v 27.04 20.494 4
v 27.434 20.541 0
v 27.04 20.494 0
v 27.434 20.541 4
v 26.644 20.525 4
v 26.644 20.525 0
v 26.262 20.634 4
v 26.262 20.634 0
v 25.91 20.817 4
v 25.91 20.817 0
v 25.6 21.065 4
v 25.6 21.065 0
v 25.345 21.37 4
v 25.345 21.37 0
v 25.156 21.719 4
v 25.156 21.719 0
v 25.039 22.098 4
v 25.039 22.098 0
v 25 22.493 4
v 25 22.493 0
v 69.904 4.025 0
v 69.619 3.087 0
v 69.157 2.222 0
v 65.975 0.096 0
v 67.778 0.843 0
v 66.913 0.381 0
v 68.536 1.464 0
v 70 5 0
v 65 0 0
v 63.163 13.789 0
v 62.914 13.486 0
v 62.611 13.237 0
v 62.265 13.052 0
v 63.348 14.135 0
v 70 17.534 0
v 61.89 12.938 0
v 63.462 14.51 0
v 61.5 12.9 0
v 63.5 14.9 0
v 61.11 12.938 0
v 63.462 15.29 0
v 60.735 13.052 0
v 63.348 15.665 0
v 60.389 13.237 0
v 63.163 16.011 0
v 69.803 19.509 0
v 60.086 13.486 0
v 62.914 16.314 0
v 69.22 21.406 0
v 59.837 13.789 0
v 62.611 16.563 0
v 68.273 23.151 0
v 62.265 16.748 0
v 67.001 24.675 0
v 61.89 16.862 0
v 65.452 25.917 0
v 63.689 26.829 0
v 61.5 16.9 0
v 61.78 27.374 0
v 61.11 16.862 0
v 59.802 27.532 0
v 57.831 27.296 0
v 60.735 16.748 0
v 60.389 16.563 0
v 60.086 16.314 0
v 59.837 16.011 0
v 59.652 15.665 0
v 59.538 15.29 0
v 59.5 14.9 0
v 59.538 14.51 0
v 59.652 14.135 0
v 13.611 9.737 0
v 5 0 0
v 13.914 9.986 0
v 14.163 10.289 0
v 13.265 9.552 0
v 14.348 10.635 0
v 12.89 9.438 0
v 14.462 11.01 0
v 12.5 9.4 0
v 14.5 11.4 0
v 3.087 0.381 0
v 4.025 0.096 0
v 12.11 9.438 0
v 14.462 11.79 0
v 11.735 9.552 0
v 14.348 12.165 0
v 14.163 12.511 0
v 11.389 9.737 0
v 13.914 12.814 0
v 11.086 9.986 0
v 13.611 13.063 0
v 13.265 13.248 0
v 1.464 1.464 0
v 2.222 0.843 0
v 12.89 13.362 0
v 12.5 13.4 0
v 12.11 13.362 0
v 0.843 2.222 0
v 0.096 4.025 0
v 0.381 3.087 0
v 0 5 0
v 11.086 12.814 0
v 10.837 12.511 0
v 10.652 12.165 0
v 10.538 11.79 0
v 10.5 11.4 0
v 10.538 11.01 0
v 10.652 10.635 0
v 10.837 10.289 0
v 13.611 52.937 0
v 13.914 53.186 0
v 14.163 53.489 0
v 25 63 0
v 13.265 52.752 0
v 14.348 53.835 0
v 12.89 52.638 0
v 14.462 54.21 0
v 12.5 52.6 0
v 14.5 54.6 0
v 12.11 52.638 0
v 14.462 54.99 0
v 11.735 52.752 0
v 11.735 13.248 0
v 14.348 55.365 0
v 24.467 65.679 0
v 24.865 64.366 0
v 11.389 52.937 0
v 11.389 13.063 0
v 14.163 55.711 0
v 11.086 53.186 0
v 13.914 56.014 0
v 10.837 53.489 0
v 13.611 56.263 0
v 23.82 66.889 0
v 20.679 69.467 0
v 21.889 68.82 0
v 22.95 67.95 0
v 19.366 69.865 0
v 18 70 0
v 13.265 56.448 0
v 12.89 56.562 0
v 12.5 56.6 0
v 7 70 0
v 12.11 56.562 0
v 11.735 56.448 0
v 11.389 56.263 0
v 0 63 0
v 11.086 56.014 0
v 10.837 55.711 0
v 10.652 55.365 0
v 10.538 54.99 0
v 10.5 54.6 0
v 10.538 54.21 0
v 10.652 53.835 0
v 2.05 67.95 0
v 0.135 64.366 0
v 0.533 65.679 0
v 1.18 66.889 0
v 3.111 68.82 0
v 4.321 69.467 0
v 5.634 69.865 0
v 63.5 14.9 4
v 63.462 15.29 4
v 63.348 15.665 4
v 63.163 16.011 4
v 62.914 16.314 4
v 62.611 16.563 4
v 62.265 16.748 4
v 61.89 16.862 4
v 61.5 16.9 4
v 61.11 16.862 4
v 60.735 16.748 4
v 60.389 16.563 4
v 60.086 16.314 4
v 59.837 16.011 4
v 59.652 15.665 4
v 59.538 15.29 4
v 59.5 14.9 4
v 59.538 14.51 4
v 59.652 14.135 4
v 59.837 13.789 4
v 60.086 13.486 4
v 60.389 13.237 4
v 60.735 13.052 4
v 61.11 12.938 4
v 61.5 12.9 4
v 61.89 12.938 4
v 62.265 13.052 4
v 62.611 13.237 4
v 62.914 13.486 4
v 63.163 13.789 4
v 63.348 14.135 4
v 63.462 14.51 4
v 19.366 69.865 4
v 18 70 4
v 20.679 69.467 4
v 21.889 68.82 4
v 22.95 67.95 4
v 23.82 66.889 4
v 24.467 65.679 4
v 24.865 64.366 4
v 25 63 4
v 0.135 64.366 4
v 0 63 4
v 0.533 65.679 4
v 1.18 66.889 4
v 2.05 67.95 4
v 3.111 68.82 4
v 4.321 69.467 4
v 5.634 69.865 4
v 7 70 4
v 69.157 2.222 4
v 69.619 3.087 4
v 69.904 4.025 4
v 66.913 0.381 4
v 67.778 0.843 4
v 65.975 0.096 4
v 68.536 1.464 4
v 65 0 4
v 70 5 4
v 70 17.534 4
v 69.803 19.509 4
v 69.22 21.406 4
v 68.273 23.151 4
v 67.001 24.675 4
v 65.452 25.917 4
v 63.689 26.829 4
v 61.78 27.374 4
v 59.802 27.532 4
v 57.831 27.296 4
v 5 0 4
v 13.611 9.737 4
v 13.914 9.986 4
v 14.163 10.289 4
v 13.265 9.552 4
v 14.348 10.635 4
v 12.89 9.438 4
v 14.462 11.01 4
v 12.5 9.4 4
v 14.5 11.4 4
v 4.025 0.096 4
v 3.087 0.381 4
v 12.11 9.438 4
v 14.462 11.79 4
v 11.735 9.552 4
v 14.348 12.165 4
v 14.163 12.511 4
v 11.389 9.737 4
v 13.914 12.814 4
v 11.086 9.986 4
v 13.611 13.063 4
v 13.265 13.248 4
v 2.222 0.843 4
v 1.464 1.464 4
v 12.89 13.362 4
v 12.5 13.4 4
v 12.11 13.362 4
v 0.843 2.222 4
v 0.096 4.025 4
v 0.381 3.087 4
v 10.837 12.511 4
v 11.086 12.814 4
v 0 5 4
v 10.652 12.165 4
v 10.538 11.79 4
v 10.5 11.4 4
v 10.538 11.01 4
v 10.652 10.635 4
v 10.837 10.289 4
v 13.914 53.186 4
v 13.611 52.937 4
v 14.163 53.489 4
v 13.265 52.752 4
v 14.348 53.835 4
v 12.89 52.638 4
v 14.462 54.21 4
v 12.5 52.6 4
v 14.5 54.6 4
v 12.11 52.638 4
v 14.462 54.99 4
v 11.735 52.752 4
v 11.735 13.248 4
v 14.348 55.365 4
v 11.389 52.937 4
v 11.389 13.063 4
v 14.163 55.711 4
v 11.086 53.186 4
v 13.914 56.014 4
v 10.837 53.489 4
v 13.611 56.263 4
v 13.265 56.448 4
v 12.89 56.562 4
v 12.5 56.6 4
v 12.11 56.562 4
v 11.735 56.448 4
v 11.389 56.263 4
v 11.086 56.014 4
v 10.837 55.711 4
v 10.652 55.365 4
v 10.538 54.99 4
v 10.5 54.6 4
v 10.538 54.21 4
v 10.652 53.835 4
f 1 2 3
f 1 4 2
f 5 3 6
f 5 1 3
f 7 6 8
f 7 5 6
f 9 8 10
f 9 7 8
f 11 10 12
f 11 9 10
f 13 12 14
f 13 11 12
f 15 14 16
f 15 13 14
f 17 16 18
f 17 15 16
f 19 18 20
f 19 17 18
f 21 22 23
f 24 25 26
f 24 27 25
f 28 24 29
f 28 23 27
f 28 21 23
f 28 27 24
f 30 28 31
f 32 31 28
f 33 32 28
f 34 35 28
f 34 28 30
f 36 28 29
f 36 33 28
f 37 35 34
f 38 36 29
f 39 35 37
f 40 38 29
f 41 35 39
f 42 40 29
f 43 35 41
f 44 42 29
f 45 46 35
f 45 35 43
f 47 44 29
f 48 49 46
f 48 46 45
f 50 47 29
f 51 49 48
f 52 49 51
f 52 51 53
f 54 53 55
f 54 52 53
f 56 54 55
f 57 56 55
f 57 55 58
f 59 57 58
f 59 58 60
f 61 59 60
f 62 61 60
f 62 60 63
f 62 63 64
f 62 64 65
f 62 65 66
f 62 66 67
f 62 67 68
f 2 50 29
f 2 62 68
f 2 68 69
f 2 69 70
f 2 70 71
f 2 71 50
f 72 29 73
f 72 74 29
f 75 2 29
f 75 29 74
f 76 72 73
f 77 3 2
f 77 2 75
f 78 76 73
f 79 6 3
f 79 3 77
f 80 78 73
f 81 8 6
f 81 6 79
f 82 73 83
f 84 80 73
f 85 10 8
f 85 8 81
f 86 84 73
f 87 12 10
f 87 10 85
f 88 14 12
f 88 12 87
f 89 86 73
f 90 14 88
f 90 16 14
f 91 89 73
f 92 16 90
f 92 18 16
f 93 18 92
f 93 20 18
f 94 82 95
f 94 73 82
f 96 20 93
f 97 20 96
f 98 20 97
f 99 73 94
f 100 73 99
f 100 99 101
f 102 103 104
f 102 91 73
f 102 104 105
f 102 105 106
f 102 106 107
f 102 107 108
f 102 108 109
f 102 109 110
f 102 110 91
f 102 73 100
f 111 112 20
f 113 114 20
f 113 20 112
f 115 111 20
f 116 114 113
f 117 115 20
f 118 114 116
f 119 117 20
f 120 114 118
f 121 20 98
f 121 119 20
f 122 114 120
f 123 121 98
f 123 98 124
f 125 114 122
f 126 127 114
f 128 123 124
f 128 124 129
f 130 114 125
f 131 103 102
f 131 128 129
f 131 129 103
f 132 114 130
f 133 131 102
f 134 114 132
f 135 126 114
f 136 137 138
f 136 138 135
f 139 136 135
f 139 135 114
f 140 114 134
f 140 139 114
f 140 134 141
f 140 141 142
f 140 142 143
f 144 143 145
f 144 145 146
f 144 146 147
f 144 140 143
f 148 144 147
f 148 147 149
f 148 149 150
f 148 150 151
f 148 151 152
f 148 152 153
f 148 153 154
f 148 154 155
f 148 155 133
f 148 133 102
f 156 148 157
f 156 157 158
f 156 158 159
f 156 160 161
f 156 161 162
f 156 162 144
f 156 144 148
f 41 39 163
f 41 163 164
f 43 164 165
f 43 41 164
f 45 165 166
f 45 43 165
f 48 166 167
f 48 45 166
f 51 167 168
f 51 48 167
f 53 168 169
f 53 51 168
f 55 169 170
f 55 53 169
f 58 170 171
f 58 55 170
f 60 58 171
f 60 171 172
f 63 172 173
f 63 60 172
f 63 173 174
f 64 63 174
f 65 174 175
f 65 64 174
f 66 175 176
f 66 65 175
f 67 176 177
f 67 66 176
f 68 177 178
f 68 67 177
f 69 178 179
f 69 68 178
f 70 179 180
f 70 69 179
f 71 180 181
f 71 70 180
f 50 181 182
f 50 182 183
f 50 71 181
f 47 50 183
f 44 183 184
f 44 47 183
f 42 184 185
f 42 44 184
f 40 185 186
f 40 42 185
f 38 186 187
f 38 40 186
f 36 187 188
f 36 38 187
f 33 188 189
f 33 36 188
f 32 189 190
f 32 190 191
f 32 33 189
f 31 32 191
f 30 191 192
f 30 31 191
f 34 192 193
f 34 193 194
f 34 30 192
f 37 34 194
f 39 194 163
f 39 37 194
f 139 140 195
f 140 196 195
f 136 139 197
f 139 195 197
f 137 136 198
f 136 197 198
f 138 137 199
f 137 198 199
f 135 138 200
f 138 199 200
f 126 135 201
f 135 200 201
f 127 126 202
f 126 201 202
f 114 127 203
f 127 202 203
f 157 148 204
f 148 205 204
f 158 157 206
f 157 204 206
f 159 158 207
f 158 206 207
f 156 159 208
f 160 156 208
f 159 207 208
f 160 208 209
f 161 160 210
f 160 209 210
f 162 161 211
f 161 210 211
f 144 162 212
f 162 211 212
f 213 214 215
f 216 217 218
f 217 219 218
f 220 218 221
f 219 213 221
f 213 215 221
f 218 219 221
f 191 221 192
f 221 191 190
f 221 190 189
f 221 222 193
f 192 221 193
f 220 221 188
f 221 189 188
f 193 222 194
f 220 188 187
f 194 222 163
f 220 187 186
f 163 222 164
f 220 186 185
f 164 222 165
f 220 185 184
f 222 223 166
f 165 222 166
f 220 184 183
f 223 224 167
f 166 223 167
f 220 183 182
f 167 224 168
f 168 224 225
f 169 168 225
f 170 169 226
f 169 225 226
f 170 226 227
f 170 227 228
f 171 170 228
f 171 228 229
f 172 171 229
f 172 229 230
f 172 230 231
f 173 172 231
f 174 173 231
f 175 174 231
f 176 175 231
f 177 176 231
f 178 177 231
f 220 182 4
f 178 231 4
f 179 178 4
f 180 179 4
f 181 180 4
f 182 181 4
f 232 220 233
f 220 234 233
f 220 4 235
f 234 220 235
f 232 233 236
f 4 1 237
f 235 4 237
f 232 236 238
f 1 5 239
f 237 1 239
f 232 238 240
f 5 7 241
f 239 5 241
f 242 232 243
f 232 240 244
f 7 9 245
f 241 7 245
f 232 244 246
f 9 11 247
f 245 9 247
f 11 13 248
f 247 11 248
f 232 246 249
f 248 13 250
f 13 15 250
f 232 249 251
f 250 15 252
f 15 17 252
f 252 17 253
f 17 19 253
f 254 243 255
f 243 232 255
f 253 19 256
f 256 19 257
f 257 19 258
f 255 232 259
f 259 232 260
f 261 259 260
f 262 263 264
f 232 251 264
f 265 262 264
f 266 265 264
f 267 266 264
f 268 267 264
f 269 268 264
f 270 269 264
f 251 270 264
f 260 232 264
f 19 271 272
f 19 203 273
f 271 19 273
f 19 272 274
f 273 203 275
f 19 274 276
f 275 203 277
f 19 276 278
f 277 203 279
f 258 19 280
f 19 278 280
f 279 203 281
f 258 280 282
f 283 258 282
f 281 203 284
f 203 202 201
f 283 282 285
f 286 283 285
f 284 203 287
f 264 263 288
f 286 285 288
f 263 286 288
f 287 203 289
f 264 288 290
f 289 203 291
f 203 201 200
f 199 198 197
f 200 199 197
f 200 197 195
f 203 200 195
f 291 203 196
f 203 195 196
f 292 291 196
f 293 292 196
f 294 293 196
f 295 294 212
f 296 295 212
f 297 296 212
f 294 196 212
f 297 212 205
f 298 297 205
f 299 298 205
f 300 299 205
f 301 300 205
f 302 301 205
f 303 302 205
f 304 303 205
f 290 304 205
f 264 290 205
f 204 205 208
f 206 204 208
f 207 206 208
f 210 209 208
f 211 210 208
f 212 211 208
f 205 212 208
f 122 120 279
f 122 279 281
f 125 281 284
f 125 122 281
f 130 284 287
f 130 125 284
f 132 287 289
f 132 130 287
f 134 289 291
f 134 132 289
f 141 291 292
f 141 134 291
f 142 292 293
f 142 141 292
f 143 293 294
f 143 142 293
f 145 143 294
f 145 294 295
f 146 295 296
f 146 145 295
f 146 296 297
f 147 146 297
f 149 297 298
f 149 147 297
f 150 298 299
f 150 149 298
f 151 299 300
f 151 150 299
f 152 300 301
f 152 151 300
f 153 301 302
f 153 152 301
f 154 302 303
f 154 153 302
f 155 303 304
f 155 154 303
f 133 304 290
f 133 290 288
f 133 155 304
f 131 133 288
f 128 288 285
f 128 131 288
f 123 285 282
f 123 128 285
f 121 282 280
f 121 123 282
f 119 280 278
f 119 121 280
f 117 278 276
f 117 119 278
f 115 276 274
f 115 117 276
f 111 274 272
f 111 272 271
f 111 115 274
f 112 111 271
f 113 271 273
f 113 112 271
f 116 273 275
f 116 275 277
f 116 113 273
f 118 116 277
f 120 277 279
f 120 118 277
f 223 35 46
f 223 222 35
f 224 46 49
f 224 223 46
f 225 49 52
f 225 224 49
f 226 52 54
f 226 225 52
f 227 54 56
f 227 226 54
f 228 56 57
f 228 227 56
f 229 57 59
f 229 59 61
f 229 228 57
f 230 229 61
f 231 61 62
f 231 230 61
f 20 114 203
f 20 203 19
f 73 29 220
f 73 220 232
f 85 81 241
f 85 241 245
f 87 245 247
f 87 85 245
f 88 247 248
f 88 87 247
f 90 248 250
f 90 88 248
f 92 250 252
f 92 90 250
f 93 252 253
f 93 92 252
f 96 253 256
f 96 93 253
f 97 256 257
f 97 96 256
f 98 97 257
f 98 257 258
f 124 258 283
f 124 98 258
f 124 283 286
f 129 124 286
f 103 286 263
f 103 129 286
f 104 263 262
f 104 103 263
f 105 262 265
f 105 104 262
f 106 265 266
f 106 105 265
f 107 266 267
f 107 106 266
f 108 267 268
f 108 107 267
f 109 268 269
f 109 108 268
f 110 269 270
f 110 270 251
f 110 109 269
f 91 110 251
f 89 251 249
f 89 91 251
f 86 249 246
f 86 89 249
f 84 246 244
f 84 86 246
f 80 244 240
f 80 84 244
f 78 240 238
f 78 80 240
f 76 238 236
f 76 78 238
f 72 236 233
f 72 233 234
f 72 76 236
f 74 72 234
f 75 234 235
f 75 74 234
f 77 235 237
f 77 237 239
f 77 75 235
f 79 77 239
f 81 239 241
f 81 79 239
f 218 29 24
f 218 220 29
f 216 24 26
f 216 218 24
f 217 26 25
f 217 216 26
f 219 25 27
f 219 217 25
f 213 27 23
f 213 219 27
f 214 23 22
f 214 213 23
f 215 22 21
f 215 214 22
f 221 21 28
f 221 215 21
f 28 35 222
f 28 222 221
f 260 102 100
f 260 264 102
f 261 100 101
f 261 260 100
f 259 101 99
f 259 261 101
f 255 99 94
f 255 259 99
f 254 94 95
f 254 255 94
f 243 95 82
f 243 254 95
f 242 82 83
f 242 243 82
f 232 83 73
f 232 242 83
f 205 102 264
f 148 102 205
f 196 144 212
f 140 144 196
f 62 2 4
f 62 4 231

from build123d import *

# Parameters (mm, degrees)
SCHIZZO1_R                   = 2
ESTRUSIONE_ESTRUSIONE1_DEPTH = 4
RACCORDO1_R                  = 7
RACCORDO2_R                  = 5
RACCORDO3_R                  = 10
RACCORDO4_R                  = 2


with BuildPart() as part:
    # Schizzo1 → Estrusione-Estrusione1 (new body)
    with BuildSketch(Plane.XY):
        Polygon((0, 0), (0, 70), (25, 70), (25, 20), (70, 30), (70, 0), align=None)
        with Locations((12.5, 11.4)):
            Circle(SCHIZZO1_R, mode=Mode.SUBTRACT)
        with Locations((12.5, 54.6)):
            Circle(SCHIZZO1_R, mode=Mode.SUBTRACT)
        with Locations((61.5, 14.9)):
            Circle(SCHIZZO1_R, mode=Mode.SUBTRACT)
    extrude(amount=ESTRUSIONE_ESTRUSIONE1_DEPTH)

    # Raccordo1
    raccordo1_edges = [part.edges().sort_by_distance(p)[0] for p in [
        (0, 70, 2),
        (25, 70, 2),
    ]]
    fillet(raccordo1_edges, radius=RACCORDO1_R)

    # Raccordo2
    raccordo2_edges = [part.edges().sort_by_distance(p)[0] for p in [
        (0, 0, 2),
        (70, 0, 2),
    ]]
    fillet(raccordo2_edges, radius=RACCORDO2_R)

    # Raccordo3
    raccordo3_edges = [part.edges().sort_by_distance(p)[0] for p in [
        (70, 30, 2),
    ]]
    fillet(raccordo3_edges, radius=RACCORDO3_R)

    # Raccordo4
    raccordo4_edges = [part.edges().sort_by_distance(p)[0] for p in [
        (25, 20, 2),
    ]]
    fillet(raccordo4_edges, radius=RACCORDO4_R)


solid = part.part
